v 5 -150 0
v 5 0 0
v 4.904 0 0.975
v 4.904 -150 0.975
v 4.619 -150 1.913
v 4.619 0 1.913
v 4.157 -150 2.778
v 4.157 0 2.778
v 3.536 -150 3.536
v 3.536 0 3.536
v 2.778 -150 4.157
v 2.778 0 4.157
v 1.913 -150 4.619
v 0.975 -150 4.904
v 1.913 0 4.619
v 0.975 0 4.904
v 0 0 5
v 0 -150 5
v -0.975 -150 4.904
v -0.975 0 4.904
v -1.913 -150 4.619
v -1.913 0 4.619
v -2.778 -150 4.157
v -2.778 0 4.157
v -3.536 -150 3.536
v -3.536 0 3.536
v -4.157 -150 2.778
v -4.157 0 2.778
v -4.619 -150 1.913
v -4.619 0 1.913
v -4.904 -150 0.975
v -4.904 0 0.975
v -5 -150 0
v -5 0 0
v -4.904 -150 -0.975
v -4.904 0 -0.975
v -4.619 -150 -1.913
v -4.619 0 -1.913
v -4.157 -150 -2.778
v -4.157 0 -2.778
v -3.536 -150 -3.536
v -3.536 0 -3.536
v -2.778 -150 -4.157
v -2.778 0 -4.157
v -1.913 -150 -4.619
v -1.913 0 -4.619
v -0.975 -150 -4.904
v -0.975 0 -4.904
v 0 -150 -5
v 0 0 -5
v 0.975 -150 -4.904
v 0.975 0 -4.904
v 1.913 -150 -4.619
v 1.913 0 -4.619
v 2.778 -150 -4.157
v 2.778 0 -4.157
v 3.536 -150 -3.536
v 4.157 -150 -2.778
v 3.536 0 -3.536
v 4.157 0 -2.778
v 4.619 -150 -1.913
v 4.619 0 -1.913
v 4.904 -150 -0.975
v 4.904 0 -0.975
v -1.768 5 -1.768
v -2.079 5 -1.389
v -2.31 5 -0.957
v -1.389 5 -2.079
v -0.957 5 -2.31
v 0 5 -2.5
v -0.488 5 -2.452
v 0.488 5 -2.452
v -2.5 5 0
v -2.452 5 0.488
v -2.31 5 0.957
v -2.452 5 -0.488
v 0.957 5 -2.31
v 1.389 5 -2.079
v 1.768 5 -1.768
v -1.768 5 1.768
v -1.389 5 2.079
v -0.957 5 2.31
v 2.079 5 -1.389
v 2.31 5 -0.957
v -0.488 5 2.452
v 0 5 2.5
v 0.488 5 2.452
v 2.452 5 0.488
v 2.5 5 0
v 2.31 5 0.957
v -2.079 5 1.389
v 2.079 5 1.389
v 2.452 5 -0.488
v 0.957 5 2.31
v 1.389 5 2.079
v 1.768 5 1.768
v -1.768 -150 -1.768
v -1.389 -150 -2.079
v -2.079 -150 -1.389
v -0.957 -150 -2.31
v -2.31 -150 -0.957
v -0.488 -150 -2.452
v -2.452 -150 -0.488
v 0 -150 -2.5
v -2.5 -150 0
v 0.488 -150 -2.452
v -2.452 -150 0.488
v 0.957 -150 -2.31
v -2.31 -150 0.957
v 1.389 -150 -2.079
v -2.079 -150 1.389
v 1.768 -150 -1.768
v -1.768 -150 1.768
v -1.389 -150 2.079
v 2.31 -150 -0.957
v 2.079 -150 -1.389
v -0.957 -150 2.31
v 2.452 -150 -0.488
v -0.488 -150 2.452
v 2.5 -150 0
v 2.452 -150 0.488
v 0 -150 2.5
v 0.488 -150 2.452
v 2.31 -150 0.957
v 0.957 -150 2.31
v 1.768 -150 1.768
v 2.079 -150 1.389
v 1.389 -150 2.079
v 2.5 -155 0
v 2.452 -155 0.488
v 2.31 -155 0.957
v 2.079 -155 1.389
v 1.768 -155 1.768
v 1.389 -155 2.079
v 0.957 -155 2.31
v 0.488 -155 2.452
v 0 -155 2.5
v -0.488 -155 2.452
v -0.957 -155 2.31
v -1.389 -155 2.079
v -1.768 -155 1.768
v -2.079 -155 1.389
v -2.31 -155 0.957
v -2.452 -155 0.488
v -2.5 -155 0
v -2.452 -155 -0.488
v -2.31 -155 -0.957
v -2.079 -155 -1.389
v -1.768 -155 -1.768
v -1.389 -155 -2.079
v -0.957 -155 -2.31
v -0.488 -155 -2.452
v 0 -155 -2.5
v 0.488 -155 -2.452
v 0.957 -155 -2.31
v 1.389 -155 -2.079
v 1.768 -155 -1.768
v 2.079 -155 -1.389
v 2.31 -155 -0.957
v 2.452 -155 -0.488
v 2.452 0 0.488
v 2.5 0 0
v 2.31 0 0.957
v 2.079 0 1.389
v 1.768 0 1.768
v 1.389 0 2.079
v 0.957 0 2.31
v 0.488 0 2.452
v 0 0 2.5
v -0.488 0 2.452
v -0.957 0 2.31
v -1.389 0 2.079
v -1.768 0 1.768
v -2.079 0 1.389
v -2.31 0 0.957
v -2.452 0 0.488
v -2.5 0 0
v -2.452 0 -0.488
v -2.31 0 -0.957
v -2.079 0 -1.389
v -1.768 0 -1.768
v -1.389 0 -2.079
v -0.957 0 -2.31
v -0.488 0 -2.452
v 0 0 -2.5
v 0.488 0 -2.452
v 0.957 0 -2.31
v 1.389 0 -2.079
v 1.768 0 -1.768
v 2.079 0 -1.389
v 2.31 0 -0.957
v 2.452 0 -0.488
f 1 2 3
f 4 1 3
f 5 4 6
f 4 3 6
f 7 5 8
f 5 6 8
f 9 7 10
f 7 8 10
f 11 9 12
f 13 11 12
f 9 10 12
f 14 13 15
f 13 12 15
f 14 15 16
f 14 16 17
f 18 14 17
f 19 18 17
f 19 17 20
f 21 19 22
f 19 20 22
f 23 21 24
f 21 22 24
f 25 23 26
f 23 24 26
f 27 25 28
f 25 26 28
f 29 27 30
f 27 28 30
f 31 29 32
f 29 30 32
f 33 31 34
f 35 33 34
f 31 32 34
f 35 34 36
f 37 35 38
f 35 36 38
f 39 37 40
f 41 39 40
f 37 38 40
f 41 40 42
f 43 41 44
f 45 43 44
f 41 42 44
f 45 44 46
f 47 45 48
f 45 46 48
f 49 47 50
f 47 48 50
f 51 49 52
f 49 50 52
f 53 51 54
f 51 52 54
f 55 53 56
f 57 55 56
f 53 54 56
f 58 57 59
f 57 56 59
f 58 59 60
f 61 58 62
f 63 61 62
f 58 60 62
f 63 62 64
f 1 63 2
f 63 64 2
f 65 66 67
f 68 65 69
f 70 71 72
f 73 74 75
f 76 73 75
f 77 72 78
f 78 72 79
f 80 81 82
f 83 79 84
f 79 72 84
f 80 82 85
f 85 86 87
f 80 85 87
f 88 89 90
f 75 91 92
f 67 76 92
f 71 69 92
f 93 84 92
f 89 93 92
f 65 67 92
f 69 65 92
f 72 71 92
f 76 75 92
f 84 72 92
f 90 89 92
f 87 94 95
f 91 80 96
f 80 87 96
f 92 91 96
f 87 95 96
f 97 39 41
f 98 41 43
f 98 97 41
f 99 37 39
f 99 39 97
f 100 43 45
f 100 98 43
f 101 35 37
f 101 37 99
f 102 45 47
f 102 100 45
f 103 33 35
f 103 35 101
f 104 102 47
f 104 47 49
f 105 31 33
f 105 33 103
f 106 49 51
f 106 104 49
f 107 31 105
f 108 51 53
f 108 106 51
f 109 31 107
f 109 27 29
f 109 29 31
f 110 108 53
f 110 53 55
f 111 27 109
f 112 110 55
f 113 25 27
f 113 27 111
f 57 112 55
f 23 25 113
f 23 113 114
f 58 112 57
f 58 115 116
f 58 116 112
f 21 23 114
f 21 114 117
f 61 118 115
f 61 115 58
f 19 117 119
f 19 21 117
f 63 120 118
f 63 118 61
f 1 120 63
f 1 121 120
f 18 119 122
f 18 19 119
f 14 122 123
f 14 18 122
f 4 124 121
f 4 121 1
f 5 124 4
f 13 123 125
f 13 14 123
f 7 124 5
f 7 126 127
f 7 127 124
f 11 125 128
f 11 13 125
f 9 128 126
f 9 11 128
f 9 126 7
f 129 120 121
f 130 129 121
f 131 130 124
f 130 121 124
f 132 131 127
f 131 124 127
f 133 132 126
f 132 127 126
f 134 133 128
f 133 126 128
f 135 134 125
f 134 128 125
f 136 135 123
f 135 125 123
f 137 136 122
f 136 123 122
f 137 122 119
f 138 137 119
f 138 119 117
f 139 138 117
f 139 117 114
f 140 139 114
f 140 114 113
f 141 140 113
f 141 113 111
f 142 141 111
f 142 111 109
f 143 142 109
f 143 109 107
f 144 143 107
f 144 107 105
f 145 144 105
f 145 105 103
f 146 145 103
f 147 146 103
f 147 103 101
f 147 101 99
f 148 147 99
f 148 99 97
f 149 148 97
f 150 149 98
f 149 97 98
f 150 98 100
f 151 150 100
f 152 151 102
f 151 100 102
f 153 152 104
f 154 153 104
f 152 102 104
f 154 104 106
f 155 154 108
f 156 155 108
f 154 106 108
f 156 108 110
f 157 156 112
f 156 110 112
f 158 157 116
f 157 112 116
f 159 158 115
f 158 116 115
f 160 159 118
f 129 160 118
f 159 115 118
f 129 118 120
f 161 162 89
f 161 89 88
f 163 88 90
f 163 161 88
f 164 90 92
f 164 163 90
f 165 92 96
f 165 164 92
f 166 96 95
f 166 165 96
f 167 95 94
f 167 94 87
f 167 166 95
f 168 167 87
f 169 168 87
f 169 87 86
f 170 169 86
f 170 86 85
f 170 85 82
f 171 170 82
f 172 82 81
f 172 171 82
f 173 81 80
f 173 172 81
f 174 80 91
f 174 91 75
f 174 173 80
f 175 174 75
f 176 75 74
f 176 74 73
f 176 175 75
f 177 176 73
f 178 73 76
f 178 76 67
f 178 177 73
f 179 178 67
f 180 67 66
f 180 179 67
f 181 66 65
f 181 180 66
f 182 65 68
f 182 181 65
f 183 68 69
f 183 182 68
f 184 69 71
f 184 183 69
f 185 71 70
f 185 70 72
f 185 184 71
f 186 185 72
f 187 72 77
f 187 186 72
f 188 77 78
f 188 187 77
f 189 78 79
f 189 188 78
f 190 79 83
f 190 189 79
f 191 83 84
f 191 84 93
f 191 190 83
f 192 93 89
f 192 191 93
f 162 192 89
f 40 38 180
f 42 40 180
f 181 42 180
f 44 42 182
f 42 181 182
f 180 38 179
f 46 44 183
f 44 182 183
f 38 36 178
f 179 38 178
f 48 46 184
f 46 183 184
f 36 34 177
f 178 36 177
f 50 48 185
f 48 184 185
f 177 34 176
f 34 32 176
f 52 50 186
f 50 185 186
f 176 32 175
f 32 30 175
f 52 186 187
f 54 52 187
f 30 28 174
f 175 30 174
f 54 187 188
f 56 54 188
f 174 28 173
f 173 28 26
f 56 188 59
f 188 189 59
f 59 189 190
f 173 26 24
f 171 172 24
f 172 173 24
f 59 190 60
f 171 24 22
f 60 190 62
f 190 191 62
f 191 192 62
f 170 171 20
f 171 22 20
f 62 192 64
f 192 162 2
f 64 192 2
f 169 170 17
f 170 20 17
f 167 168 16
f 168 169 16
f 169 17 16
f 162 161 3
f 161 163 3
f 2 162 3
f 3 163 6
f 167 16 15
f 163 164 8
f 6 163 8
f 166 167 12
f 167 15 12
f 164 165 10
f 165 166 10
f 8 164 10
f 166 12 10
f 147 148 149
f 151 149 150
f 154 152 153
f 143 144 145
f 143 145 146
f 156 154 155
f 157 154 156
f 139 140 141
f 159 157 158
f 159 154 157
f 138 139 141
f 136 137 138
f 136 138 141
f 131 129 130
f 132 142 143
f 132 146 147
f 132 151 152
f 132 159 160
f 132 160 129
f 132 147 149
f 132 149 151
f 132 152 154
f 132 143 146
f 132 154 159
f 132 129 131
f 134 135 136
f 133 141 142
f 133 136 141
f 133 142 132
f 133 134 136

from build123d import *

# Parameters (mm, degrees)
F0_R     = 5
F1_DEPTH = 150
F2_R     = 2.5
F3_DEPTH = 5
F4_R     = 2.5
F5_DEPTH = 155


with BuildPart() as f1:
    # F0 (on Front) → F1 (new body)
    with BuildSketch(Plane.XZ):
        Circle(F0_R)
    extrude(amount=F1_DEPTH)

    # F2 (on Front) → F3 (join)
    with BuildSketch(Plane.XZ):
        Circle(F2_R)
    extrude(amount=-F3_DEPTH)

    # F4 (on Front) → F5 (join)
    with BuildSketch(Plane.XZ):
        Circle(F4_R)
    extrude(amount=F5_DEPTH)


solid = f1.part
